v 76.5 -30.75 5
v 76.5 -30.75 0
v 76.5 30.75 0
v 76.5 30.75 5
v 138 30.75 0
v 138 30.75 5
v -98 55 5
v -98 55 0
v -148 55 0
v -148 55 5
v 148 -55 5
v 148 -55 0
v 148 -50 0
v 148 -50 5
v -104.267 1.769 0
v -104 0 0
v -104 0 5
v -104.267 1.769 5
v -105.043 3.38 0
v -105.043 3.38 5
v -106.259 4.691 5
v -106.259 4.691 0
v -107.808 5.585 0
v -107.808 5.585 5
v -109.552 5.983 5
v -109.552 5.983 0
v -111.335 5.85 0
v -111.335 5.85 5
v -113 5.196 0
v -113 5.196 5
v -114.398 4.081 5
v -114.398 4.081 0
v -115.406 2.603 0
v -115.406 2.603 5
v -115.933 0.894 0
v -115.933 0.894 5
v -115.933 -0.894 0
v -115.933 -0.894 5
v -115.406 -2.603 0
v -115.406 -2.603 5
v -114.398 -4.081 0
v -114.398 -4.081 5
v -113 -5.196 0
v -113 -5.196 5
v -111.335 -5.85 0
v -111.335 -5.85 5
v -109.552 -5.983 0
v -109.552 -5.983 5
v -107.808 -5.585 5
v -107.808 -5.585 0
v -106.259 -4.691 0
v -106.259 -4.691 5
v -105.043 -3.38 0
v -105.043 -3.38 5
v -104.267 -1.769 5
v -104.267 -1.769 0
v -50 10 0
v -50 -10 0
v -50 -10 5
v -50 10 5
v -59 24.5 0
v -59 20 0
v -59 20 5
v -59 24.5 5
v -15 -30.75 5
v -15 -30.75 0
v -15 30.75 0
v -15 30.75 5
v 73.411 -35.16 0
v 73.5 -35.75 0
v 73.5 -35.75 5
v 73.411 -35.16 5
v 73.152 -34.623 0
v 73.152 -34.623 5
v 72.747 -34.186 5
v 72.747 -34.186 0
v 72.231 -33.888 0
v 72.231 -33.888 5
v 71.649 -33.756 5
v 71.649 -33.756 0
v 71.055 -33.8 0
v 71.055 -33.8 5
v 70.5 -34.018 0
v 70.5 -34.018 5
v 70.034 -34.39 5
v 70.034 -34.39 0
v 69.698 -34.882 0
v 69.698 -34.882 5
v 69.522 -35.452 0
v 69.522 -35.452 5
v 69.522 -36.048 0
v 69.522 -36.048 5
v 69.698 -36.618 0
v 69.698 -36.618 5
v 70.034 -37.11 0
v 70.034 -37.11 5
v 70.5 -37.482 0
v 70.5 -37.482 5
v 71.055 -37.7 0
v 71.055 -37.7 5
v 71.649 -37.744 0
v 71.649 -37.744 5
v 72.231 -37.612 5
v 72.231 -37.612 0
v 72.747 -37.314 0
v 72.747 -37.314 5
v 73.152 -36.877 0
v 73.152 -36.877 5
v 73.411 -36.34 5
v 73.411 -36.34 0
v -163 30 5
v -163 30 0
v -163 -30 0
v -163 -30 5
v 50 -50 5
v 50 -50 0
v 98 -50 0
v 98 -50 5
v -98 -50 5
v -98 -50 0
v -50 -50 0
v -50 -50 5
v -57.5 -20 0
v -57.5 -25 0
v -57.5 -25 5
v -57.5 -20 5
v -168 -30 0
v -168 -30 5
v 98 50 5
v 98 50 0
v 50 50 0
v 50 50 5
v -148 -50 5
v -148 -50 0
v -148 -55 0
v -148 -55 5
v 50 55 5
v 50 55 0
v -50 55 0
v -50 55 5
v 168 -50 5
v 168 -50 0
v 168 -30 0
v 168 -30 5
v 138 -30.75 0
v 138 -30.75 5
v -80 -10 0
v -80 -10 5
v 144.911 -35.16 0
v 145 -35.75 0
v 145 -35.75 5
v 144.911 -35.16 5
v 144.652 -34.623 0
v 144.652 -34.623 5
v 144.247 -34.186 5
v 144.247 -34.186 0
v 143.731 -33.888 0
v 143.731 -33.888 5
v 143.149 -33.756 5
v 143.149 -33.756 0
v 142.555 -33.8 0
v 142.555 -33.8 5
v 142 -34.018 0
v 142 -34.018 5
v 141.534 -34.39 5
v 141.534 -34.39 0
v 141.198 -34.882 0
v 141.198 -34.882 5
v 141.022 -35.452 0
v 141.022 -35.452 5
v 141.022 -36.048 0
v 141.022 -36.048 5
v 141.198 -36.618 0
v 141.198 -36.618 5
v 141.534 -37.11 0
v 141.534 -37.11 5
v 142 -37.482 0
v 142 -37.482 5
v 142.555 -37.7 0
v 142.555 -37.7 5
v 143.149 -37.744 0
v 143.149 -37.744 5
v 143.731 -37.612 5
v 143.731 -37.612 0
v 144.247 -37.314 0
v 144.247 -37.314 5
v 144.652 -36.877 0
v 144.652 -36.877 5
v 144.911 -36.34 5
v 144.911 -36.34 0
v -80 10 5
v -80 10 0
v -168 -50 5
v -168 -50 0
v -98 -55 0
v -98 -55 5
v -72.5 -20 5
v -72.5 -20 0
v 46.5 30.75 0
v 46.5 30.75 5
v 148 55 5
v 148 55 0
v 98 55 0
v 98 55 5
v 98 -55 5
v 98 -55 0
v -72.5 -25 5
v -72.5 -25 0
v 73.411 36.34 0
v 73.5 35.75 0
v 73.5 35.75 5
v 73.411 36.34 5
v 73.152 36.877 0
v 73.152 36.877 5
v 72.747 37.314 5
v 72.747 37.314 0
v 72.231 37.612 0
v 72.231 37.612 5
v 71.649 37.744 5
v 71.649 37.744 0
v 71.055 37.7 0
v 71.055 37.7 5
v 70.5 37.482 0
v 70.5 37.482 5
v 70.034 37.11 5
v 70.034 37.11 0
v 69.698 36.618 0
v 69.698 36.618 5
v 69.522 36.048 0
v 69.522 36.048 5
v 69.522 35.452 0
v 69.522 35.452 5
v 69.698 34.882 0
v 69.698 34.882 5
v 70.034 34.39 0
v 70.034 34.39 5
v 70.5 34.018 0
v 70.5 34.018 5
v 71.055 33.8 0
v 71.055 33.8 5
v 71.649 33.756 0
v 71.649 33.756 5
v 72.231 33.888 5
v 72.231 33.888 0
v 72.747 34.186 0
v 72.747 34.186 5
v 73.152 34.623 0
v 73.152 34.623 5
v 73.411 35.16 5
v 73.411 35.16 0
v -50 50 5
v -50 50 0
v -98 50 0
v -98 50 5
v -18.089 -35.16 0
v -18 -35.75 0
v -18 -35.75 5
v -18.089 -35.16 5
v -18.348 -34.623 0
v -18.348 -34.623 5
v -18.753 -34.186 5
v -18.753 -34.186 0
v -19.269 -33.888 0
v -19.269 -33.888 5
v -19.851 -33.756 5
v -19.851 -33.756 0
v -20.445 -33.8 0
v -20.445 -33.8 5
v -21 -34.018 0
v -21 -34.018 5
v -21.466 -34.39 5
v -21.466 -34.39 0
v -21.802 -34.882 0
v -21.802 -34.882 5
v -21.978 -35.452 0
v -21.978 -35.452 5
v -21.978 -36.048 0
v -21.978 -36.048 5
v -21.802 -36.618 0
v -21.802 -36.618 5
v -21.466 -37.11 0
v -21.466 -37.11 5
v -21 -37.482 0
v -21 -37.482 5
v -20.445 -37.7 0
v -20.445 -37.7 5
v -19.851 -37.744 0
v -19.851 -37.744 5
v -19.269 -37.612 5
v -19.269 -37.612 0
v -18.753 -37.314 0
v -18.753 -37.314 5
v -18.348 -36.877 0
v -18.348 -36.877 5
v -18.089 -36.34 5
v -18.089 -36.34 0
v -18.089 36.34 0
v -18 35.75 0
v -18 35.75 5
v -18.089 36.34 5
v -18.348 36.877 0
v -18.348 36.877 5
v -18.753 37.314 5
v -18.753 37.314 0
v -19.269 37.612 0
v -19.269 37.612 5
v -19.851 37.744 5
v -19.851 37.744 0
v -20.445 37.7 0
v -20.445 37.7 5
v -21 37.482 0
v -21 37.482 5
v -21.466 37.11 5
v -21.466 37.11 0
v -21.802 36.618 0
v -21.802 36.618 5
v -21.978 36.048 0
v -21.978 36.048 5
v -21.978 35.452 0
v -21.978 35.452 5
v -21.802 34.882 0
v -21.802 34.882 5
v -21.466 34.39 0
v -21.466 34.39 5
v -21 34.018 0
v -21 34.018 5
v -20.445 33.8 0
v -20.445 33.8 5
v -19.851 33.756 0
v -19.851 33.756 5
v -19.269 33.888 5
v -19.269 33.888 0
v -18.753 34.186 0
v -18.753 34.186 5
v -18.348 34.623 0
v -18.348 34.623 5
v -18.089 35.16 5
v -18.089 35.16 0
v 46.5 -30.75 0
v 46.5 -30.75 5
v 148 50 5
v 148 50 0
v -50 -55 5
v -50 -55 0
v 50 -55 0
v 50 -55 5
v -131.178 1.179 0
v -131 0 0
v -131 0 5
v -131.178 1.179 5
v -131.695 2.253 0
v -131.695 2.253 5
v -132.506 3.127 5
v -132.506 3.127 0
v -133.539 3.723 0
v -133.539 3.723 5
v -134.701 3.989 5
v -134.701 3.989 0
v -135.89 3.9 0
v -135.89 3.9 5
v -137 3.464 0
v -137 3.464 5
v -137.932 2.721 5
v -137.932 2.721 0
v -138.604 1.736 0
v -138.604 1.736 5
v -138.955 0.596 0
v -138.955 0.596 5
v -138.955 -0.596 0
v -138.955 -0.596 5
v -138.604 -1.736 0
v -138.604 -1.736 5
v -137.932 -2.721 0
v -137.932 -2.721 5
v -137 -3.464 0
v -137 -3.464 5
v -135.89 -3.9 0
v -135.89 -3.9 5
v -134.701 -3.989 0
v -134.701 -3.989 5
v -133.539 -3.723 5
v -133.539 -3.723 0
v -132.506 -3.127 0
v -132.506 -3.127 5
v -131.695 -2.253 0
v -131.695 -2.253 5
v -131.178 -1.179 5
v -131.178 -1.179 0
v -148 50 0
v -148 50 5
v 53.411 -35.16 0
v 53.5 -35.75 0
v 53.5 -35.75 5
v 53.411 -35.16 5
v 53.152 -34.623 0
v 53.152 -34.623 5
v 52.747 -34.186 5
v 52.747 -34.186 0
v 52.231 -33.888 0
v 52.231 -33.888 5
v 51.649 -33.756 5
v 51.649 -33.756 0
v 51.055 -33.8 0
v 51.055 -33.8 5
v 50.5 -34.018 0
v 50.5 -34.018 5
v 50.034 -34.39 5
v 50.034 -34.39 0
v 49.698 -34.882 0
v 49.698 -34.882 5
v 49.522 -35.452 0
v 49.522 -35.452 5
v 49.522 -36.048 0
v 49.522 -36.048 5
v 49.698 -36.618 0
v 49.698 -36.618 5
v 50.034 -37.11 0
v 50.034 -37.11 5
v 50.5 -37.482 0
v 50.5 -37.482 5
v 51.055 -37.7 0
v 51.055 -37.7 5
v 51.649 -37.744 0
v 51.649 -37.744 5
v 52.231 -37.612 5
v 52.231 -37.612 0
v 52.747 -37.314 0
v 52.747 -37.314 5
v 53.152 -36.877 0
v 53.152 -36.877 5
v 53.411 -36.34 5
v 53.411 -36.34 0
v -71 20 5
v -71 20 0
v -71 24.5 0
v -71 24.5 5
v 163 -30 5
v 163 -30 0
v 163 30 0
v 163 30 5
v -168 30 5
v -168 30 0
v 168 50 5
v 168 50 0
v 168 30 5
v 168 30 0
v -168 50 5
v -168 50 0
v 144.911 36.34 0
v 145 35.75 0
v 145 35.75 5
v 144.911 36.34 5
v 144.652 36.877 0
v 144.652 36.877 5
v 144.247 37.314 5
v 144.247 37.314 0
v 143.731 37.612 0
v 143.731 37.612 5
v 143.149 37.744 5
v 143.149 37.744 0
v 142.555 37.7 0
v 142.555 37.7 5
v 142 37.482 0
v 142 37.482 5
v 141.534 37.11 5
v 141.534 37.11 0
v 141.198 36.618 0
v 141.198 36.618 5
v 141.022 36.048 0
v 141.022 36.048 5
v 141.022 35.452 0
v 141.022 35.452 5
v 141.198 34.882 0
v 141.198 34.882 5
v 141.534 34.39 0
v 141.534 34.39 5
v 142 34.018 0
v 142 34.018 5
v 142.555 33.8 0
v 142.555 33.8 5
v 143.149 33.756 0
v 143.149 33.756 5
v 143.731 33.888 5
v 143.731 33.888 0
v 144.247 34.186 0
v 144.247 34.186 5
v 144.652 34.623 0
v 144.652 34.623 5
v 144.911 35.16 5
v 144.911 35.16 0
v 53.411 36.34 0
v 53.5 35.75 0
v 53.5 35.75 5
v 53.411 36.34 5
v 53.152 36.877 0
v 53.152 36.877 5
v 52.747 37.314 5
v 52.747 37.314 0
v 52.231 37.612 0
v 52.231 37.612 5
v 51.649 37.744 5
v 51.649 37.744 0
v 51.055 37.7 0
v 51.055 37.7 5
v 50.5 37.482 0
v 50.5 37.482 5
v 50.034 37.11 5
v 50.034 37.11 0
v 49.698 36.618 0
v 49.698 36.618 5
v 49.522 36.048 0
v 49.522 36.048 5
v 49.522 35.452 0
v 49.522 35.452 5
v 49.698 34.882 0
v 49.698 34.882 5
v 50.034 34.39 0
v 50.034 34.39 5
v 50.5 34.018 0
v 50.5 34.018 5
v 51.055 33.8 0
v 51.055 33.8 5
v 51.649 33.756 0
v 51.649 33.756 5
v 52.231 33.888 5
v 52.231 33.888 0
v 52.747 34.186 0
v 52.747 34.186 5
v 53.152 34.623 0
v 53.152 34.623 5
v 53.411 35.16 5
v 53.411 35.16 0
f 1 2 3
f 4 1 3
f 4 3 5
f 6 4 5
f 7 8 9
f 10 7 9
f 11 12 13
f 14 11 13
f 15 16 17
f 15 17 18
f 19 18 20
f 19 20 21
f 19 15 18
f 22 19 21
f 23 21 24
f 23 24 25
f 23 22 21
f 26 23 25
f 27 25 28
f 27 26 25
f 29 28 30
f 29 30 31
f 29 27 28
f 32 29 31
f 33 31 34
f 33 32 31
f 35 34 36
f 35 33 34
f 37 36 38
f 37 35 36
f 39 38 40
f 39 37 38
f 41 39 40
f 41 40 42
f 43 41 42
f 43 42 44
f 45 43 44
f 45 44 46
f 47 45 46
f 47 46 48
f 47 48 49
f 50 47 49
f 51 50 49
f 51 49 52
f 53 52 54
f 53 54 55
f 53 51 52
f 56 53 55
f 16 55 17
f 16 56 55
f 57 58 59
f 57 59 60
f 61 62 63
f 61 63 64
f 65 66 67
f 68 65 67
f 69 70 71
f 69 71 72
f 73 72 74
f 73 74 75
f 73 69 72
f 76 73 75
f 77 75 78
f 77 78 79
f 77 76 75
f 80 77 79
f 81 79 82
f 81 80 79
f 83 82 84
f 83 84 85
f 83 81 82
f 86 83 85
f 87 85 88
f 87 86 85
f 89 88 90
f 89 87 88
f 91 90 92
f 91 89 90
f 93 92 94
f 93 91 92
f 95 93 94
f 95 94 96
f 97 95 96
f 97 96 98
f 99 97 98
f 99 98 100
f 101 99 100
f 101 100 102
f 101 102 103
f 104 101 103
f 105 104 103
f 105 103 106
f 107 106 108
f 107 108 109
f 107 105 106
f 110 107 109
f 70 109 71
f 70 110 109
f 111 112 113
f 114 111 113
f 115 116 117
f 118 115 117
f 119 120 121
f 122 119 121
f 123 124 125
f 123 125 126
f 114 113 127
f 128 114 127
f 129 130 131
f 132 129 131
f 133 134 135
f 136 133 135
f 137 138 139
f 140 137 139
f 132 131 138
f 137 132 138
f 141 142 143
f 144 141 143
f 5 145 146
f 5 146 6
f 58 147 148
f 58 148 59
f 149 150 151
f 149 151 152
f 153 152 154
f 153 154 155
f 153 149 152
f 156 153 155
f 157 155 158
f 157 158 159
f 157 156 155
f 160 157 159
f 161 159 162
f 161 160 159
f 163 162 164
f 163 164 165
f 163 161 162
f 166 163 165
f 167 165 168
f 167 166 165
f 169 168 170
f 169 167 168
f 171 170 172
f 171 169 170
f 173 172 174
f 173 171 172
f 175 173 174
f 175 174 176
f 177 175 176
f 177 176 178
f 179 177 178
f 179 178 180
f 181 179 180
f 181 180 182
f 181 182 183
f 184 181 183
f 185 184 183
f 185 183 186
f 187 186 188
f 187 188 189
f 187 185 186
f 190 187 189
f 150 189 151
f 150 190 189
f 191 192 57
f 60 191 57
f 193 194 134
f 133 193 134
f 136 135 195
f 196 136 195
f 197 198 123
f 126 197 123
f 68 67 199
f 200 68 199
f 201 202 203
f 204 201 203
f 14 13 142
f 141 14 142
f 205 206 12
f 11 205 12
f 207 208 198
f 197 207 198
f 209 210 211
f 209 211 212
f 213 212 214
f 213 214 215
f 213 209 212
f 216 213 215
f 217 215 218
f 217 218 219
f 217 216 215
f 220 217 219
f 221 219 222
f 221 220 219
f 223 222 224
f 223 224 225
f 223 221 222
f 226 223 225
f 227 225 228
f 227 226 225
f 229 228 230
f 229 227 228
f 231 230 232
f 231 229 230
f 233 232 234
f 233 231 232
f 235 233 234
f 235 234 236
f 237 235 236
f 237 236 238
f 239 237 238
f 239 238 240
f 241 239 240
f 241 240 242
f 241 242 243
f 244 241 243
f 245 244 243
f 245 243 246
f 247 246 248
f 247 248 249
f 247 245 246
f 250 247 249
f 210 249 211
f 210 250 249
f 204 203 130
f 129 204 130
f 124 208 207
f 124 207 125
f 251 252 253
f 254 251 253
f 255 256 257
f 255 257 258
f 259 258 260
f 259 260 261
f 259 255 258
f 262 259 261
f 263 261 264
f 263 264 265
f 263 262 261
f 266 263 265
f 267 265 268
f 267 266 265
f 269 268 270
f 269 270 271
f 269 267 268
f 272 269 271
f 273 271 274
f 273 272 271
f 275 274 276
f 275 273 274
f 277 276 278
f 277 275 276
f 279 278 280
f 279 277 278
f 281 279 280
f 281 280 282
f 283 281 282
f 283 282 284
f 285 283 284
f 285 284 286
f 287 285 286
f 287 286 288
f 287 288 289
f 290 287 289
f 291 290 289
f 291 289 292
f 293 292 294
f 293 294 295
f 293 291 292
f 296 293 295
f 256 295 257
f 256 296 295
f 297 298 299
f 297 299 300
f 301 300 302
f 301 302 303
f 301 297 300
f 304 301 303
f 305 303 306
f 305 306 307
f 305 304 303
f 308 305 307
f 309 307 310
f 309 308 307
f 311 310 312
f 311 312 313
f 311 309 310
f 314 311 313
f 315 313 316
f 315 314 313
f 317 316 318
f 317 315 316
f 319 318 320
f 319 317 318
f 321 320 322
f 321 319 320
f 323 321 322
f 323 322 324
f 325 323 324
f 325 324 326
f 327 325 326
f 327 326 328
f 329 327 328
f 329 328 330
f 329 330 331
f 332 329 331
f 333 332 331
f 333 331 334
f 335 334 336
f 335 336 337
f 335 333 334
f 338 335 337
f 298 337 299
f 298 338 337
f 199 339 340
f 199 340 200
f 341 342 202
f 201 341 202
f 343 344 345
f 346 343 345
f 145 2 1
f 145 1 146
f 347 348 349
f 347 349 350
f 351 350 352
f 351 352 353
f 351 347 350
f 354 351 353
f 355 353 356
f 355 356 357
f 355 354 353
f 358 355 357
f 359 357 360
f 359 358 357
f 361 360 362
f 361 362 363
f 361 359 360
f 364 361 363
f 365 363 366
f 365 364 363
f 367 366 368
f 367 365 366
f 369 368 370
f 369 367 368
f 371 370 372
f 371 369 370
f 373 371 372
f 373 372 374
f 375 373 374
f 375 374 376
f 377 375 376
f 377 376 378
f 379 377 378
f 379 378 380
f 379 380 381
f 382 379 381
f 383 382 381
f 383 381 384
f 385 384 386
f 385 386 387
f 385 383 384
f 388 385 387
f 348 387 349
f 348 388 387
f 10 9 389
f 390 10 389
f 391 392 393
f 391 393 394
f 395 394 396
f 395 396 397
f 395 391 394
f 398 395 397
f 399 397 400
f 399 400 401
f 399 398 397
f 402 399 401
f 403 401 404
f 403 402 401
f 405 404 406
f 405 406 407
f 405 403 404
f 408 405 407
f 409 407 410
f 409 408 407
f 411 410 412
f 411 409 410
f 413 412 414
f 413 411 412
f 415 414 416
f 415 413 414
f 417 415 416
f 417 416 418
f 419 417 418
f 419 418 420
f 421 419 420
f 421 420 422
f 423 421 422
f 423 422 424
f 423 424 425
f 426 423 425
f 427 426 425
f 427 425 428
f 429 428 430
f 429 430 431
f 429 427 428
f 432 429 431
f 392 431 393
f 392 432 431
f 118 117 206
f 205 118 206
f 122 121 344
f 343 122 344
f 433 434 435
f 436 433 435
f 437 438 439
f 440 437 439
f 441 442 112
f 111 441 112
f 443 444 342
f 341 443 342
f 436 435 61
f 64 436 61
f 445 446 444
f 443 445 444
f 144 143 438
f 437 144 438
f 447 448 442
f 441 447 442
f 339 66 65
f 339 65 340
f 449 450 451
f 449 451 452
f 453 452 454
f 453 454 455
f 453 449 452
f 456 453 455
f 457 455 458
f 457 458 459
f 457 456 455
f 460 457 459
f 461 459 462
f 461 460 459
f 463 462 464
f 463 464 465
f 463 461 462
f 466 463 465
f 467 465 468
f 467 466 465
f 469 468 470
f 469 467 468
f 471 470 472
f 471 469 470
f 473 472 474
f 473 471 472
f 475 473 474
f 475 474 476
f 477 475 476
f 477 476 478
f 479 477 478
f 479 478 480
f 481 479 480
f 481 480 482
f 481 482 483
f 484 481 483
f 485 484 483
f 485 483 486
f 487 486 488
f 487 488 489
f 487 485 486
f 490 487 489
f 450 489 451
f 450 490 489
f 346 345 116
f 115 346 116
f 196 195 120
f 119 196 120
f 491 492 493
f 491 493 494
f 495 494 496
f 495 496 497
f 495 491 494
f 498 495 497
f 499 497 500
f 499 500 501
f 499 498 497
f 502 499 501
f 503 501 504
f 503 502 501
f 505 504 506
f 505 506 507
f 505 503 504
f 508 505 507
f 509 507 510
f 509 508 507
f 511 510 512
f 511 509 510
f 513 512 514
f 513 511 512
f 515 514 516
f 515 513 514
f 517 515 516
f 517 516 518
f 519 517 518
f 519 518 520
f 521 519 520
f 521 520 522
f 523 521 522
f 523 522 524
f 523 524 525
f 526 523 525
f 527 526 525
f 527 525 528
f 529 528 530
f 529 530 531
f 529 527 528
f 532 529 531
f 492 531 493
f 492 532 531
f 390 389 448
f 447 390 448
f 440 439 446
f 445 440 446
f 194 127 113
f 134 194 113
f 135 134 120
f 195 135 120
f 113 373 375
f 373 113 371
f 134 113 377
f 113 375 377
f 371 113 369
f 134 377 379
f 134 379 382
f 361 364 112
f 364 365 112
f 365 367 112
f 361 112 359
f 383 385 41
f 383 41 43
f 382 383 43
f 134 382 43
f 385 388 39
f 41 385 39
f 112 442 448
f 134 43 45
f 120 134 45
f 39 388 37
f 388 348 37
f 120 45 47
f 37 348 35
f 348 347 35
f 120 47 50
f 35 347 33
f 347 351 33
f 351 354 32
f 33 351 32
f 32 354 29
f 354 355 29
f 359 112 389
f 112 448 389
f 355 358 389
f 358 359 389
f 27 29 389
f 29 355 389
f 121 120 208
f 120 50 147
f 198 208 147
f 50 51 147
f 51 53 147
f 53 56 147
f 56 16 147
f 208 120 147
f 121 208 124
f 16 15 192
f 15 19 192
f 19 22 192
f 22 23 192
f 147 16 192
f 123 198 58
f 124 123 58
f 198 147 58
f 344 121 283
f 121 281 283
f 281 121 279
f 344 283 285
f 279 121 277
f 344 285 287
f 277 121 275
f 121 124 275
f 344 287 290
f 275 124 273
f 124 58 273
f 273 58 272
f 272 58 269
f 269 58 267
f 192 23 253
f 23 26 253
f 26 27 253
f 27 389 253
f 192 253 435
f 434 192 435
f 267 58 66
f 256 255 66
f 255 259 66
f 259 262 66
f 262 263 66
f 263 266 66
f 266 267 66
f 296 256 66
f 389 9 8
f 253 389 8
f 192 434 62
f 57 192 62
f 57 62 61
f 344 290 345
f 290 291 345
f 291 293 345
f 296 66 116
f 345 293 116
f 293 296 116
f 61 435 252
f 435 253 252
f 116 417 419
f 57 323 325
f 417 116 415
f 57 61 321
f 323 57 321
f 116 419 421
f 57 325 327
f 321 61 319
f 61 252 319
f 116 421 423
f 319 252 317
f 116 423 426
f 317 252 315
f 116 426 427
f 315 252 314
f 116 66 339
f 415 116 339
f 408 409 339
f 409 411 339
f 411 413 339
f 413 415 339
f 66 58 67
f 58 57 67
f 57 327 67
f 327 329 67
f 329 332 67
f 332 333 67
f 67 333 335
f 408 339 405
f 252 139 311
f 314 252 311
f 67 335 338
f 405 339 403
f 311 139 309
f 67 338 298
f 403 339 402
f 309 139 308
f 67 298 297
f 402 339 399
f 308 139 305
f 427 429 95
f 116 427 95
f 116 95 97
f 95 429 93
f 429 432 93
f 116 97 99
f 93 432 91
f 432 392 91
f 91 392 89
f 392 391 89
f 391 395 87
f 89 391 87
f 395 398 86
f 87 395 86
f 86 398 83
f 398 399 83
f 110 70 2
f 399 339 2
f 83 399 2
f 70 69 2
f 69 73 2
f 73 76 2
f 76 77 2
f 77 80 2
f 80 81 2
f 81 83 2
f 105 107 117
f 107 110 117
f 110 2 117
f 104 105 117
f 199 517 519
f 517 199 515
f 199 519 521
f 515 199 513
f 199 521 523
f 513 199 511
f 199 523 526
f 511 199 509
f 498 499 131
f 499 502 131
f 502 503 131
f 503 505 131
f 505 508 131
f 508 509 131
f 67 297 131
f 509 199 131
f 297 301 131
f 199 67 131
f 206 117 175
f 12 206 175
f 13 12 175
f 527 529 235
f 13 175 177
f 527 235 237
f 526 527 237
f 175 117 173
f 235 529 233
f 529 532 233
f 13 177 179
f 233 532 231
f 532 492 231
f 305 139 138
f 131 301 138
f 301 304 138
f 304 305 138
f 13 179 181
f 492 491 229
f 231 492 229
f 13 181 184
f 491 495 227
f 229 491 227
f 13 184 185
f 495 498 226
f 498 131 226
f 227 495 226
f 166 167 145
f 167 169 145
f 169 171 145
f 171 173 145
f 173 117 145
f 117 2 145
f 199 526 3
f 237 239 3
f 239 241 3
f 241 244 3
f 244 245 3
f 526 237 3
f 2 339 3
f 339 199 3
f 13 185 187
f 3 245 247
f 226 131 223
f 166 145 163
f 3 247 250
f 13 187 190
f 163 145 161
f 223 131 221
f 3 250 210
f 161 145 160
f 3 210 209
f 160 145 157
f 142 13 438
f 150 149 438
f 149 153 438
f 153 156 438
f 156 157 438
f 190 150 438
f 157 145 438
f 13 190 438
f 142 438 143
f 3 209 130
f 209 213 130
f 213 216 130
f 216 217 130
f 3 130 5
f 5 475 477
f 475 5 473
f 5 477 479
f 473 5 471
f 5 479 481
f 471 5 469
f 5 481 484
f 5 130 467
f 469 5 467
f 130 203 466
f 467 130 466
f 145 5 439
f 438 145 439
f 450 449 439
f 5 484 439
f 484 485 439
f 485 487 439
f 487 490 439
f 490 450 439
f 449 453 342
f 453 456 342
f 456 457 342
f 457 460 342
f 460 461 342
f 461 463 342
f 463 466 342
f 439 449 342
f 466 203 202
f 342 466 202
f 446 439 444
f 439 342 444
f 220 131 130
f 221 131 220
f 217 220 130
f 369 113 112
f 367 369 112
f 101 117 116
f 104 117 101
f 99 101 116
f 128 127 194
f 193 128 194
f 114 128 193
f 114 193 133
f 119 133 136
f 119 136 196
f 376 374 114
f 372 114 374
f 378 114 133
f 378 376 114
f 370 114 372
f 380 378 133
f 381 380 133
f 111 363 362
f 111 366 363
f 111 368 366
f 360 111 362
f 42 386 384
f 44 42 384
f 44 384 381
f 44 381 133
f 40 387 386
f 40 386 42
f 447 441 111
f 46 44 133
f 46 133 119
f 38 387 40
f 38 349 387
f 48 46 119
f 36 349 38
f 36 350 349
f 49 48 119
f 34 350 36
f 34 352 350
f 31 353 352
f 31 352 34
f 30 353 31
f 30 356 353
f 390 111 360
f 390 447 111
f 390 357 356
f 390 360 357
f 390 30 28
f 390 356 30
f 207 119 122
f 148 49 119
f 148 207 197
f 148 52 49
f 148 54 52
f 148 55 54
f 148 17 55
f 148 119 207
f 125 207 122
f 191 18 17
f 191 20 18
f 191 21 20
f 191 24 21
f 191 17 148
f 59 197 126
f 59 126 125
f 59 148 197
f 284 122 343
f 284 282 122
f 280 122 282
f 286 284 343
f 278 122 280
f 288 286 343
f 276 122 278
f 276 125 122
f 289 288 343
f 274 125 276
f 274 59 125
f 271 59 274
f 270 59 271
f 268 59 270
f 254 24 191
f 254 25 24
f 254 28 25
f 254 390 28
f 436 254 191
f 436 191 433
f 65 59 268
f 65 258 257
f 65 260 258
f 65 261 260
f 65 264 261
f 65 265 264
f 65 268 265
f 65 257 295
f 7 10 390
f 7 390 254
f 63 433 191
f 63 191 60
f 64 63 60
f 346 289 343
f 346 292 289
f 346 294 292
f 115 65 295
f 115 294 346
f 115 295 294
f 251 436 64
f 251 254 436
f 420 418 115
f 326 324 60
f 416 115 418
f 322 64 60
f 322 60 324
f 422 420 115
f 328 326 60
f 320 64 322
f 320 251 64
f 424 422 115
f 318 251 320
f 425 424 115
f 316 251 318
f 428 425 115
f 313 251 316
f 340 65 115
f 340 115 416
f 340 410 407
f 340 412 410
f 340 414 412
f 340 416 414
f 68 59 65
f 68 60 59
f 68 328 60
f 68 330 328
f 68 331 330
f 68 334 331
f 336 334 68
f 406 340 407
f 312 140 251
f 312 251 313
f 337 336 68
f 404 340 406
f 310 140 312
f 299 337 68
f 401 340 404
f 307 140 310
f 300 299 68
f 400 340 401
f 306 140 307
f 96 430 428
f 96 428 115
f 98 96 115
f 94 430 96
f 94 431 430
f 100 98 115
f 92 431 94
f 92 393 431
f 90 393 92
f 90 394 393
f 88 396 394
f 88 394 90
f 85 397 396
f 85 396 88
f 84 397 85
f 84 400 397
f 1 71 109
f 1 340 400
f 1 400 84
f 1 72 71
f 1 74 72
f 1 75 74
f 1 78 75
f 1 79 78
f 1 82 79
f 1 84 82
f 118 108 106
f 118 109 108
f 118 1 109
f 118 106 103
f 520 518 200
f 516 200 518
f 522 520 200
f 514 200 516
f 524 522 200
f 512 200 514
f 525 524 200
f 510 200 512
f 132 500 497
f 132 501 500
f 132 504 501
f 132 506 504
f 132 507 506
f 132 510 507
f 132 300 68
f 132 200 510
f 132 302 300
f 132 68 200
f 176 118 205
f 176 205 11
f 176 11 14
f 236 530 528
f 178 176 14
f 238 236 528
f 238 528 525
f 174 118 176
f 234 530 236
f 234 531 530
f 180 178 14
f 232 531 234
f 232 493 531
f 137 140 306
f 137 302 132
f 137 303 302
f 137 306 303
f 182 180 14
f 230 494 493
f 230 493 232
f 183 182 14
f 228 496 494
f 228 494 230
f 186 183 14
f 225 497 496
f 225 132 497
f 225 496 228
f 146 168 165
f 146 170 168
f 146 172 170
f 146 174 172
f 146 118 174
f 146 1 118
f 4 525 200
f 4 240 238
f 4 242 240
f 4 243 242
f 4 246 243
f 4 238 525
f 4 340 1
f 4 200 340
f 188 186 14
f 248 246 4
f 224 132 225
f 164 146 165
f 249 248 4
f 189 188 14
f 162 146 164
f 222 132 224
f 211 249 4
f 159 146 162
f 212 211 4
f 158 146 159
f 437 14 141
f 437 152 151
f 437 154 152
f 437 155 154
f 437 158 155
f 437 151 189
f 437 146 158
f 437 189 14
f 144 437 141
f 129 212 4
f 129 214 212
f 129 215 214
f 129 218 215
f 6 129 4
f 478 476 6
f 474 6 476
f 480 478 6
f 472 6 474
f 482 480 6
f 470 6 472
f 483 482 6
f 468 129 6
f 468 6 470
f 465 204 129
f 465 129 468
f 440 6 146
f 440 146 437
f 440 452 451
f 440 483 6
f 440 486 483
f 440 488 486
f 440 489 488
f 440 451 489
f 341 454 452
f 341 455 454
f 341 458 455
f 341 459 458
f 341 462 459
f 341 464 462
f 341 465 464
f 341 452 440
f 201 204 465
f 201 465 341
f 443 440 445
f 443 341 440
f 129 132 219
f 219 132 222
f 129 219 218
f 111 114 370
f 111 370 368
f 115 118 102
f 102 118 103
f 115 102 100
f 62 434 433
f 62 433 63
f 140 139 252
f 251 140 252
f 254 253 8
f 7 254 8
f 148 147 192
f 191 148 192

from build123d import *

# Parameters (mm, degrees)
SKETCH1_R           = 2
SKETCH1_W           = 15
SKETCH1_H           = 5
SKETCH1_W_2         = 61.5
SKETCH1_H_2         = 61.5
SKETCH1_R_2         = 4
SKETCH1_R_3         = 6
SKETCH1_W_3         = 30
SKETCH1_H_3         = 20
SKETCH1_W_4         = 12
SKETCH1_H_4         = 4.5
BOSS_EXTRUDE1_DEPTH = 5


with BuildPart() as part:
    # Sketch1 → Boss-Extrude1 (new body)
    with BuildSketch(Plane.XY):
        Polygon((148, -50), (168, -50), (168, -30), (163, -30), (163, 30), (168, 30), (168, 50), (148, 50), (148, 55), (98, 55), (98, 50), (50, 50), (50, 55), (-50, 55), (-50, 50), (-98, 50), (-98, 55), (-148, 55), (-148, 50), (-168, 50), (-168, 30), (-163, 30), (-163, -30), (-168, -30), (-168, -50), (-148, -50), (-148, -55), (-98, -55), (-98, -50), (-50, -50), (-50, -55), (50, -55), (50, -50), (98, -50), (98, -55), (148, -55), align=None)
        with Locations((-20, -35.75)):
            Circle(SKETCH1_R, mode=Mode.SUBTRACT)
        with Locations((-65, -22.5)):
            Rectangle(SKETCH1_W, SKETCH1_H, mode=Mode.SUBTRACT)
        with Locations((51.5, -35.75)):
            Circle(SKETCH1_R, mode=Mode.SUBTRACT)
        with Locations((71.5, -35.75)):
            Circle(SKETCH1_R, mode=Mode.SUBTRACT)
        with Locations((143, -35.75)):
            Circle(SKETCH1_R, mode=Mode.SUBTRACT)
        with Locations((15.75, 0)):
            Rectangle(SKETCH1_W_2, SKETCH1_H_2, mode=Mode.SUBTRACT)
        with Locations((-135, 0)):
            Circle(SKETCH1_R_2, mode=Mode.SUBTRACT)
        with Locations((-110, 0)):
            Circle(SKETCH1_R_3, mode=Mode.SUBTRACT)
        with Locations((-65, 0)):
            Rectangle(SKETCH1_W_3, SKETCH1_H_3, mode=Mode.SUBTRACT)
        with Locations((-65, 22.25)):
            Rectangle(SKETCH1_W_4, SKETCH1_H_4, mode=Mode.SUBTRACT)
        with Locations((-20, 35.75)):
            Circle(SKETCH1_R, mode=Mode.SUBTRACT)
        with Locations((107.25, 0)):
            Rectangle(SKETCH1_W_2, SKETCH1_H_2, mode=Mode.SUBTRACT)
        with Locations((51.5, 35.75)):
            Circle(SKETCH1_R, mode=Mode.SUBTRACT)
        with Locations((71.5, 35.75)):
            Circle(SKETCH1_R, mode=Mode.SUBTRACT)
        with Locations((143, 35.75)):
            Circle(SKETCH1_R, mode=Mode.SUBTRACT)
    extrude(amount=BOSS_EXTRUDE1_DEPTH)


solid = part.part
